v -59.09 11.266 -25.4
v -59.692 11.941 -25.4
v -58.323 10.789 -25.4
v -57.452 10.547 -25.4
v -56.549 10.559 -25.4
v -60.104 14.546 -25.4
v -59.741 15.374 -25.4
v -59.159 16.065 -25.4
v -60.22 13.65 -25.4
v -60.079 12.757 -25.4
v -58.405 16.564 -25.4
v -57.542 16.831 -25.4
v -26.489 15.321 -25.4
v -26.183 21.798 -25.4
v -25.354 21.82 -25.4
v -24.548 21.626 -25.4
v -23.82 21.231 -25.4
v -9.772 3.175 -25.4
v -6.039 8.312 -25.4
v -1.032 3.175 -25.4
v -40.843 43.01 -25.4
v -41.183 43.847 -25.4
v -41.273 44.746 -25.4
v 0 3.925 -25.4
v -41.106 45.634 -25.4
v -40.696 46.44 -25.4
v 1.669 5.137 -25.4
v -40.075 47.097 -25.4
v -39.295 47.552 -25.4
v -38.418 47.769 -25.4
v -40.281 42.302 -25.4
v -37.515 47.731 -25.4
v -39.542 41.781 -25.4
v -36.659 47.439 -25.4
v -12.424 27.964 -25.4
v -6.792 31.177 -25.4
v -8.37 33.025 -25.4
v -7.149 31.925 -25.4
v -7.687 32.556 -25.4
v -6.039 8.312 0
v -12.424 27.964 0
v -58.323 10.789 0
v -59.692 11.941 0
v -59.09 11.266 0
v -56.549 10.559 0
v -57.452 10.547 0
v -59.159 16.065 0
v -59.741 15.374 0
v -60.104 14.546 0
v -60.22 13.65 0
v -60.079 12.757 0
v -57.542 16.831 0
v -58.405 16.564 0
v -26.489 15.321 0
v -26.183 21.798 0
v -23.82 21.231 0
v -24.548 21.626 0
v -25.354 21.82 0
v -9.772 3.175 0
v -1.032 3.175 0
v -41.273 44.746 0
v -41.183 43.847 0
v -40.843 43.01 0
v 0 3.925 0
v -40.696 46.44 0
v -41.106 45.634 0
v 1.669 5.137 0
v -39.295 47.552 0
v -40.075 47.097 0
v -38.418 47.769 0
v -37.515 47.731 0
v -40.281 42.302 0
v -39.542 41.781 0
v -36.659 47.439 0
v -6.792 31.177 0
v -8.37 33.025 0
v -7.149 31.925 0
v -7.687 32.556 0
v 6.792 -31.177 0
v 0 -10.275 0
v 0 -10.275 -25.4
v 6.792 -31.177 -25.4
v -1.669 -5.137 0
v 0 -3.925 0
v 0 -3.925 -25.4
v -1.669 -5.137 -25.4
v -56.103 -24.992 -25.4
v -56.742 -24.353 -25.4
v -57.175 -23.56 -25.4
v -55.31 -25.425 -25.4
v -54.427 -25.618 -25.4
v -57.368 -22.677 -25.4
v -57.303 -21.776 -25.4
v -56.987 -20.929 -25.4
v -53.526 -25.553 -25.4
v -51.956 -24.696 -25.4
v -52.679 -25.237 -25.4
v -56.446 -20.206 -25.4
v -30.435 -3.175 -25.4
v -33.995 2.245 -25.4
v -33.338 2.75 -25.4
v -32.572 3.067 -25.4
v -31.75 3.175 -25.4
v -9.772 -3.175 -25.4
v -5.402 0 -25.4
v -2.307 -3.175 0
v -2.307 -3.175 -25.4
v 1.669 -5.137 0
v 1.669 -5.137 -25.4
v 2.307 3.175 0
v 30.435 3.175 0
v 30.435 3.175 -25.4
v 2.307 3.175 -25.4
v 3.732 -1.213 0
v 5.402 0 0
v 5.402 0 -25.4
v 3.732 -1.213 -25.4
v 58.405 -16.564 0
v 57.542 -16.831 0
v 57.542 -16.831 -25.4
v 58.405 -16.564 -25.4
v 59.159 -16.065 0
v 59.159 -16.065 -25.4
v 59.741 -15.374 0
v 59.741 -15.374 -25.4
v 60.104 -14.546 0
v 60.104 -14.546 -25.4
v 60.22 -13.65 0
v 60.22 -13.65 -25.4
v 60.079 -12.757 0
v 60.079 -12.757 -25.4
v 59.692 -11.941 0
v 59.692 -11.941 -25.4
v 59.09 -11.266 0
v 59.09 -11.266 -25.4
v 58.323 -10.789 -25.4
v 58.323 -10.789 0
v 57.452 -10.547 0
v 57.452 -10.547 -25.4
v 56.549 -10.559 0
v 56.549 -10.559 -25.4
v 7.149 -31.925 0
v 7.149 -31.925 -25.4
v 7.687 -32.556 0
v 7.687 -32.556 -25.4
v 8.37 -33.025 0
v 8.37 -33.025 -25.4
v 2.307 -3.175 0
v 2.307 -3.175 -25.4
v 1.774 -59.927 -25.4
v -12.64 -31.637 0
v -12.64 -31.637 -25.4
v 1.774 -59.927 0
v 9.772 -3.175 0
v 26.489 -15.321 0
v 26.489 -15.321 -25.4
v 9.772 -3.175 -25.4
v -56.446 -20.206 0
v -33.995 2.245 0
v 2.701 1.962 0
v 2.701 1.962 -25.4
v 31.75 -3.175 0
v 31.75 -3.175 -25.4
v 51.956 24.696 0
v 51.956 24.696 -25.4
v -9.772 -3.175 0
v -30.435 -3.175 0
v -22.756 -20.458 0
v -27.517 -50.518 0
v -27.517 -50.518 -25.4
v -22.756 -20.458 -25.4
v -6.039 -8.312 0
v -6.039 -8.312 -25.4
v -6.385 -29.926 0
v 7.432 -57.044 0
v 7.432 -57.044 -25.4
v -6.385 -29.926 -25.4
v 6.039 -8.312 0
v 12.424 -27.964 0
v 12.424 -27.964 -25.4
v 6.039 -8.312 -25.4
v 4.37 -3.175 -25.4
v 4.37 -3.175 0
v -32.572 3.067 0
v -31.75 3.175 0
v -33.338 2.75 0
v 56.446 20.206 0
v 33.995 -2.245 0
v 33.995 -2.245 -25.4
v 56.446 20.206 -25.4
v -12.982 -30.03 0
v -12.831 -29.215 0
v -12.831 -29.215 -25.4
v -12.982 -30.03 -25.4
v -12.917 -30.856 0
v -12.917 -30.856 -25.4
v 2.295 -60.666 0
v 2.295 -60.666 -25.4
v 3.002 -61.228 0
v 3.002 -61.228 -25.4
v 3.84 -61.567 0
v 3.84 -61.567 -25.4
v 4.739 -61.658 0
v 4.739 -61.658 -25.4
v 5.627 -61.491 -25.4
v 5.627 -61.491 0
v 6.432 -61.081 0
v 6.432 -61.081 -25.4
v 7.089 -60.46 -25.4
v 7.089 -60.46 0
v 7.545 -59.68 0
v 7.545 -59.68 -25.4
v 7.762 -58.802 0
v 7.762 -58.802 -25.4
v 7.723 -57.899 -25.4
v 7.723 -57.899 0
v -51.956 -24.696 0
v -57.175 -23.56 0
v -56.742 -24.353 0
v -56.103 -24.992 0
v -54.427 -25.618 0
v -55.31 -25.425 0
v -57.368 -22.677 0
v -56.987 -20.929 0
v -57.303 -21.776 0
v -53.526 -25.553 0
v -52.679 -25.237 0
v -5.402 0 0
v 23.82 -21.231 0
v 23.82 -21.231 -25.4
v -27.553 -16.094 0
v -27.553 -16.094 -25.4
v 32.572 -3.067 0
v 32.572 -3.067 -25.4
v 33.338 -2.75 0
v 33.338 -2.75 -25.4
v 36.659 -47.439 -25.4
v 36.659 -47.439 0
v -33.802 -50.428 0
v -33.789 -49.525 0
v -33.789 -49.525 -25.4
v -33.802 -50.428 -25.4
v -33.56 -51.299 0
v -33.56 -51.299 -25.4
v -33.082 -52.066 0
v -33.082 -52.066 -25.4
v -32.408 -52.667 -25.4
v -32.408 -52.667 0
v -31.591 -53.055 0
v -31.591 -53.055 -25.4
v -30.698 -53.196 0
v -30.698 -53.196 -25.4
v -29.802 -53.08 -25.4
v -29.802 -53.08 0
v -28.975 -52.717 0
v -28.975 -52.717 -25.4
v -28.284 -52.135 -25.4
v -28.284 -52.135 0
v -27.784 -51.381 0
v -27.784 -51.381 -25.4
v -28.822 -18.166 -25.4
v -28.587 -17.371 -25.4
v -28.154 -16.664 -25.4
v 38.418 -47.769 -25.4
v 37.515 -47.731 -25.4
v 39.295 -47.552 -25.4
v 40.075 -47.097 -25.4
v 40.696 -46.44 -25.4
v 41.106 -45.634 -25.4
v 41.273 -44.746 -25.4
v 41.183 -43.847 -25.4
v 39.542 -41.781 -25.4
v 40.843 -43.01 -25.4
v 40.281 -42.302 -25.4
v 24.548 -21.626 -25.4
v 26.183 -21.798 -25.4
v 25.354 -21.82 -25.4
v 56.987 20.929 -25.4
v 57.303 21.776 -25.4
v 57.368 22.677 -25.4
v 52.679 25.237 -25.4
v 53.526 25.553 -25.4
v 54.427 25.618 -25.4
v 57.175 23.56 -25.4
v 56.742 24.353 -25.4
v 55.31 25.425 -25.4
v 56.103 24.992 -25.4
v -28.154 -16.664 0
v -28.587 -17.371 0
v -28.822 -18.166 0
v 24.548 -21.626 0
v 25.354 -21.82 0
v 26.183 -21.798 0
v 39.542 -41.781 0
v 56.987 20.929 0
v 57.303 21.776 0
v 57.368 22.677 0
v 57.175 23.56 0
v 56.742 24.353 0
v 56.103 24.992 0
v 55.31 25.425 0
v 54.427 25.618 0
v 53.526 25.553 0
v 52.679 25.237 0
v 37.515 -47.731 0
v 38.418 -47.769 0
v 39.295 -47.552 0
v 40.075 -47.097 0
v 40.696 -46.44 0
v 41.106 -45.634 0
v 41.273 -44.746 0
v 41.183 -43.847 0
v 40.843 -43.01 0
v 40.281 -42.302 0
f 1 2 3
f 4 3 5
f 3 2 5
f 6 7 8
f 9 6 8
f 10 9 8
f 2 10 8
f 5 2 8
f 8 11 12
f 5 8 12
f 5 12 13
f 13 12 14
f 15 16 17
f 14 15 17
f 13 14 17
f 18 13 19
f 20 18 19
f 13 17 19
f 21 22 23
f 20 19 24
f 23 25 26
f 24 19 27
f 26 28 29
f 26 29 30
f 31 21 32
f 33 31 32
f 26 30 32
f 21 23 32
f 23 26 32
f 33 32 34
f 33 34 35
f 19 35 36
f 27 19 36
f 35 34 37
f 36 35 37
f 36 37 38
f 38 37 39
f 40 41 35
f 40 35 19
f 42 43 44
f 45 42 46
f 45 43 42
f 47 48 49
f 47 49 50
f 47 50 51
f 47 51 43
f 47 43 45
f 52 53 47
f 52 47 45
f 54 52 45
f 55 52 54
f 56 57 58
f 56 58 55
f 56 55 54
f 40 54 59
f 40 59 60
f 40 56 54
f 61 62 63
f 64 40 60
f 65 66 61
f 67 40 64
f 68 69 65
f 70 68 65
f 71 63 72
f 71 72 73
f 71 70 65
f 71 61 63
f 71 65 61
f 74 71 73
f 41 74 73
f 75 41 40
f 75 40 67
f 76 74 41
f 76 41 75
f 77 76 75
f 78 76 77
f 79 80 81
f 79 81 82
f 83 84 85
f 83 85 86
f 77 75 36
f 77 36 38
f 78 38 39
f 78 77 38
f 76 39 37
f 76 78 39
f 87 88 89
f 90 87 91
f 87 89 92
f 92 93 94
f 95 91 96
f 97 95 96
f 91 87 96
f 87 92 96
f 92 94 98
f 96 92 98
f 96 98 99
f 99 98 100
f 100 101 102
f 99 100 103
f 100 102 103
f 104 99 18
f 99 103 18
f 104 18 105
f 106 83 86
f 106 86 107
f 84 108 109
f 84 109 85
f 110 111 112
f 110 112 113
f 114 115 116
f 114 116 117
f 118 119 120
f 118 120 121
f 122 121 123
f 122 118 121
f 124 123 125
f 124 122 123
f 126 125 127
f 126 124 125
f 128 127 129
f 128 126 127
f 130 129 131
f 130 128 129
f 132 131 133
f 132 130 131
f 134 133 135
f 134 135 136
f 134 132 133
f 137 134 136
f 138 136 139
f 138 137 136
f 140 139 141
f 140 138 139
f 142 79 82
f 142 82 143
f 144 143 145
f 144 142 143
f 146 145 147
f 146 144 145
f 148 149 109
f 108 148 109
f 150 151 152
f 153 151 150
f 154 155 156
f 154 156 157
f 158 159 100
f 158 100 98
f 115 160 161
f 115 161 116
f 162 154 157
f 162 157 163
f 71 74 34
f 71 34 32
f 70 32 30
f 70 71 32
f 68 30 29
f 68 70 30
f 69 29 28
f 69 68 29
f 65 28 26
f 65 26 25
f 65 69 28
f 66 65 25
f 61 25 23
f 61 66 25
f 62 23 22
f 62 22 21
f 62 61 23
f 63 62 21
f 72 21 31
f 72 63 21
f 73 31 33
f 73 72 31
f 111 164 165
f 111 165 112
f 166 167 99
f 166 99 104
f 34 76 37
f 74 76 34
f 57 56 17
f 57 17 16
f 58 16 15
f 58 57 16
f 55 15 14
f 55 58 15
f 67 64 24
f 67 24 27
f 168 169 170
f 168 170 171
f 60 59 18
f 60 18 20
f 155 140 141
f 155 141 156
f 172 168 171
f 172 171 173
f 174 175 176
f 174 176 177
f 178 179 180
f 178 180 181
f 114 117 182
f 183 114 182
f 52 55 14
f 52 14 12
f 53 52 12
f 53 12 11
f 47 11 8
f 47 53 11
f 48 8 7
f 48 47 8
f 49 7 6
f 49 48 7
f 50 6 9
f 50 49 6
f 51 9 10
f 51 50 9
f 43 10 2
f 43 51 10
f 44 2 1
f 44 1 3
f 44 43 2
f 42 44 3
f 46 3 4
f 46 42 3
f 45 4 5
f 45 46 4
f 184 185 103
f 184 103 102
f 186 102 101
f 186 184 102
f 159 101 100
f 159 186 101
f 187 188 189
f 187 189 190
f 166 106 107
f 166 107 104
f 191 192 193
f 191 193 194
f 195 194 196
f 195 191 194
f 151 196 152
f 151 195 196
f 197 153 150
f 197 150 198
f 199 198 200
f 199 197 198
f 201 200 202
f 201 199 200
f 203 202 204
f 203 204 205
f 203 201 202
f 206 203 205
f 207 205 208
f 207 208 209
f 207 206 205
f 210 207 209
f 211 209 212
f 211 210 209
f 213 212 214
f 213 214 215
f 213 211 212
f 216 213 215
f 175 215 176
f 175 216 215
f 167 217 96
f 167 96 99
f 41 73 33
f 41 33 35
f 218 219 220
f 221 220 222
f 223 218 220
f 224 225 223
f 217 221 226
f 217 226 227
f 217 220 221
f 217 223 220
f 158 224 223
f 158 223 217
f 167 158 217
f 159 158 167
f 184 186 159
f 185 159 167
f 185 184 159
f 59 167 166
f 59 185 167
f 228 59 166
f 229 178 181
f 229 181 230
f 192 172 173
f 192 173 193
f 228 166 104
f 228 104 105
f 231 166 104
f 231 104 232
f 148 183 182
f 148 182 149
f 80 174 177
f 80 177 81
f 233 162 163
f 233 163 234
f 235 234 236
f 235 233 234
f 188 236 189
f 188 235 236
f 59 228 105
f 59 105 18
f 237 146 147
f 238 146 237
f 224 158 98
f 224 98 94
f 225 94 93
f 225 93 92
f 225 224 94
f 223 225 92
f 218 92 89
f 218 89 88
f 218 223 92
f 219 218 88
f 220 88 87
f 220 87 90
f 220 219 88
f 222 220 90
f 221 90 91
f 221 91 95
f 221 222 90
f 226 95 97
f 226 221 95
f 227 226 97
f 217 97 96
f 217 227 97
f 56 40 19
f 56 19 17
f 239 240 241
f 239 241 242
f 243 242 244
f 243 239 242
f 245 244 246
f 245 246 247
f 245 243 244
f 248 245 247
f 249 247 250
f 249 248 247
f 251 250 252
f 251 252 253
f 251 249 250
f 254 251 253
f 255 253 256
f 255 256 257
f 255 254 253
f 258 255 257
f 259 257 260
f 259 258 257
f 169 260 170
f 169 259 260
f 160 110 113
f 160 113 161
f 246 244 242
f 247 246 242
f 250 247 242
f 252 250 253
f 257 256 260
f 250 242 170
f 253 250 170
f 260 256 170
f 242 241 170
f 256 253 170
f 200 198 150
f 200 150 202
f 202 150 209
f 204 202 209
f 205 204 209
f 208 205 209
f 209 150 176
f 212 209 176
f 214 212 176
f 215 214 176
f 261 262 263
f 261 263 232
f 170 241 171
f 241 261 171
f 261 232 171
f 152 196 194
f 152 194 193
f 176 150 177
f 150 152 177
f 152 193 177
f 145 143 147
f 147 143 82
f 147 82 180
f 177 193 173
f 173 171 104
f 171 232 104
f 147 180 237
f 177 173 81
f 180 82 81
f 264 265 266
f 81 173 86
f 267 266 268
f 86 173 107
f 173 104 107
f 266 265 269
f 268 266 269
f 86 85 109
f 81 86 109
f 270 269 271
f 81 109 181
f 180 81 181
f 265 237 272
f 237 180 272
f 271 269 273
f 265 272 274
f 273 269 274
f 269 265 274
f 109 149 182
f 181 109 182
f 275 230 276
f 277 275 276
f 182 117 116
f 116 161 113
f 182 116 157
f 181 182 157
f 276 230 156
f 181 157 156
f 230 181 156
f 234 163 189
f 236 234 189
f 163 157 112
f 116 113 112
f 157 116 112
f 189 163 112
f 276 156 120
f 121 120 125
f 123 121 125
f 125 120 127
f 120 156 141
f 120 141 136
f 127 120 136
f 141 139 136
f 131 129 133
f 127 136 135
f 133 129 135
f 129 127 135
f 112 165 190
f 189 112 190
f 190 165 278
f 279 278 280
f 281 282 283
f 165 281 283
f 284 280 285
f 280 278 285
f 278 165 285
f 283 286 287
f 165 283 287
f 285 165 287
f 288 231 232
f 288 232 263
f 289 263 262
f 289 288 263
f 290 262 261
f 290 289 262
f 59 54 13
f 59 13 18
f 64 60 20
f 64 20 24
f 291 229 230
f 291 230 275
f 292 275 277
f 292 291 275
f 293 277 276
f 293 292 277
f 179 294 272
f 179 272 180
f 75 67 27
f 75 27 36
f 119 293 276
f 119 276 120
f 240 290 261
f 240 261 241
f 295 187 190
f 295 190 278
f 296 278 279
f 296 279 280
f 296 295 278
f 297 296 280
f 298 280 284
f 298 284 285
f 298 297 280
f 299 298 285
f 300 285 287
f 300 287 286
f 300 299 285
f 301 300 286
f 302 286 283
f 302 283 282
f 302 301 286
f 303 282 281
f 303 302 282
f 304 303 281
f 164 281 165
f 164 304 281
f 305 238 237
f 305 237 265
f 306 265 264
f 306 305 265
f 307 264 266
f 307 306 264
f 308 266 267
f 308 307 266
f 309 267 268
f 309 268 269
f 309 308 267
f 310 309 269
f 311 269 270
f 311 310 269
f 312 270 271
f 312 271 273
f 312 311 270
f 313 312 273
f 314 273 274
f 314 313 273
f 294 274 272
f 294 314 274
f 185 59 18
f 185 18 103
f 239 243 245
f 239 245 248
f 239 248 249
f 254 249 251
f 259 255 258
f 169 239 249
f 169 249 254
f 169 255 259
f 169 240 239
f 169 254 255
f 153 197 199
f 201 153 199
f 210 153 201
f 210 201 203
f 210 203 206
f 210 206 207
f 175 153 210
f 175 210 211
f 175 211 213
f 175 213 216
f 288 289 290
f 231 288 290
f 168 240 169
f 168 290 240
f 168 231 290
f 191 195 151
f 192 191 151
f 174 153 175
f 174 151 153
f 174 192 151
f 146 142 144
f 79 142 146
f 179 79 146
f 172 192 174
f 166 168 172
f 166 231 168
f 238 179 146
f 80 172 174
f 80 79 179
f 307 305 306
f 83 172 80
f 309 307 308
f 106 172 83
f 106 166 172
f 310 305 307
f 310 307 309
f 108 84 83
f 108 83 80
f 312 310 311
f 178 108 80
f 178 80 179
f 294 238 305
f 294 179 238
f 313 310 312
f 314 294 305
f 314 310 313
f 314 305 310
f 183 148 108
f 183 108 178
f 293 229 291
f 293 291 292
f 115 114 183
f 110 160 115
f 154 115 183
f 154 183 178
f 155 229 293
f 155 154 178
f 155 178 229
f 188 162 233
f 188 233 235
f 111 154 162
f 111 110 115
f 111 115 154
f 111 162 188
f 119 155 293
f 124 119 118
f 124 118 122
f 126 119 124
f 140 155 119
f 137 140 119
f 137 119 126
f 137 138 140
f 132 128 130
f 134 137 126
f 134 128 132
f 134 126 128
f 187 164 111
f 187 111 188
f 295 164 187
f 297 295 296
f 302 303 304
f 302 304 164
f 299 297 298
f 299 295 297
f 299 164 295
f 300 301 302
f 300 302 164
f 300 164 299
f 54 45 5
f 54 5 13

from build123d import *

# Parameters (mm, degrees)
F1_DEPTH = 25.4


# Not quite as in the source:
# - a feature names something its author has since deleted; it is built from what else it names


with BuildPart() as f1:
    # F0 (on Top) → F1 (new body)
    with BuildSketch(Plane.XY):
        with BuildLine():
            Line((9.7716452305, -3.175), (31.75, -3.175))
            ThreePointArc((31.75, -3.175), (32.9650198978, -2.9333175157), (33.9950640303, -2.2450640303))
            Line((33.9950640303, -2.2450640303), (56.4457043329, 20.2055762724))
            ThreePointArc((56.4457043329, 20.2055762724), (56.4457043329, 24.6957043329), (51.9555762724, 24.6957043329))
            Line((51.9555762724, 24.6957043329), (30.4348719395, 3.175))
            Line((30.4348719395, 3.175), (9.7716452305, 3.175))
            Line((9.7716452305, 3.175), (5.401632633, 0))
            Line((5.401632633, 0), (9.7716452305, -3.175))
        make_face()
        with BuildLine():
            Line((26.4885467967, -15.3205399243), (9.7716452305, -3.175))
            Line((9.7716452305, -3.175), (4.3700125975, -3.175))
            Line((4.3700125975, -3.175), (6.0392088785, -8.3122579143))
            Line((6.0392088785, -8.3122579143), (23.8200713954, -21.2308107174))
            ThreePointArc((23.8200713954, -21.2308107174), (24.9451005412, -21.7494562575), (26.1829689979, -21.7980922417))
            Line((26.1829689979, -21.7980922417), (57.5420738118, -16.8312979766))
            ThreePointArc((57.5420738118, -16.8312979766), (60.1813048667, -13.1987080688), (56.5487149588, -10.5594770139))
            Line((56.5487149588, -10.5594770139), (26.4885467967, -15.3205399243))
        make_face()
        Polygon((4.3700125975, -3.175), (9.7716452305, -3.175), (5.401632633, 0), (3.7324363521, -1.2127420857), align=None)
        Polygon((6.0392088785, -8.3122579143), (4.3700125975, -3.175), (2.3067725264, -3.175), (1.669196281, -5.1372579143), align=None)
        Polygon((2.7008163165, 1.9622579143), (5.401632633, 0), (9.7716452305, 3.175), (2.3067725264, 3.175), align=None)
        with BuildLine():
            Line((12.4244970902, -27.9641543235), (6.0392088785, -8.3122579143))
            Line((6.0392088785, -8.3122579143), (1.669196281, -5.1372579143))
            Line((1.669196281, -5.1372579143), (0, -10.2745158286))
            Line((0, -10.2745158286), (6.7916851322, -31.1771733495))
            ThreePointArc((6.7916851322, -31.1771733495), (7.3970006306, -32.2580419458), (8.3698697347, -33.0249901067))
            Line((8.3698697347, -33.0249901067), (36.6593268777, -47.4391884734))
            ThreePointArc((36.6593268777, -47.4391884734), (40.9296924287, -46.0516625958), (39.5421665511, -41.7812970448))
            Line((39.5421665511, -41.7812970448), (12.4244970902, -27.9641543235))
        make_face()
        Polygon((0, -10.2745158286), (1.669196281, -5.1372579143), (0, -3.9245158286), (-1.669196281, -5.1372579143), align=None)
        with BuildLine():
            Line((-6.3852882117, -29.9264122378), (0, -10.2745158286))
            Line((0, -10.2745158286), (-1.669196281, -5.1372579143))
            Line((-1.669196281, -5.1372579143), (-6.0392088785, -8.3122579143))
            Line((-6.0392088785, -8.3122579143), (-12.8308940106, -29.2149154352))
            ThreePointArc((-12.8308940106, -29.2149154352), (-12.976502106, -30.4451520213), (-12.6402352857, -31.637464229))
            Line((-12.6402352857, -31.637464229), (1.773963081, -59.926921372))
            ThreePointArc((1.773963081, -59.926921372), (6.044328632, -61.3144472496), (7.4318545096, -57.0440816987))
            Line((7.4318545096, -57.0440816987), (-6.3852882117, -29.9264122378))
        make_face()
        with BuildLine():
            Line((-6.0392088785, -8.3122579143), (-1.669196281, -5.1372579143))
            Line((-1.669196281, -5.1372579143), (-2.3067725264, -3.175))
            Line((-2.3067725264, -3.175), (-9.7716452305, -3.175))
            Line((-9.7716452305, -3.175), (-27.5525077474, -16.0935528031))
            ThreePointArc((-27.5525077474, -16.0935528031), (-28.3934220932, -17.0032488173), (-28.8222000528, -18.1655023338))
            Line((-28.8222000528, -18.1655023338), (-33.7889943178, -49.5246071477))
            ThreePointArc((-33.7889943178, -49.5246071477), (-31.1497632629, -53.1571970556), (-27.517173355, -50.5179660007))
            Line((-27.517173355, -50.5179660007), (-22.7561104446, -20.4577978386))
            Line((-22.7561104446, -20.4577978386), (-6.0392088785, -8.3122579143))
        make_face()
    extrude(amount=-F1_DEPTH)


with BuildPart() as f1b:
    # F0 (on Top) → F1, piece 2 (new body)
    with BuildSketch(Plane.XY):
        Polygon((0, 3.9245158286), (1.669196281, 5.1372579143), (0, 10.2745158286), (-1.669196281, 5.1372579143), align=None)
        Polygon((-1.0316200355, 3.175), (0, 3.9245158286), (-1.669196281, 5.1372579143), (-2.3067725264, 3.175), align=None)
        with BuildLine():
            Line((-1.669196281, 5.1372579143), (0, 10.2745158286))
            Line((0, 10.2745158286), (-6.7916851322, 31.1771733495))
            ThreePointArc((-6.7916851322, 31.1771733495), (-7.3970006306, 32.2580419458), (-8.3698697347, 33.0249901067))
            Line((-8.3698697347, 33.0249901067), (-36.6593268777, 47.4391884734))
            ThreePointArc((-36.6593268777, 47.4391884734), (-40.9296924287, 46.0516625958), (-39.5421665511, 41.7812970448))
            Line((-39.5421665511, 41.7812970448), (-12.4244970902, 27.9641543235))
            Line((-12.4244970902, 27.9641543235), (-6.0392088785, 8.3122579143))
            Line((-6.0392088785, 8.3122579143), (-1.669196281, 5.1372579143))
        make_face()
        Polygon((-2.3067725264, 3.175), (-1.669196281, 5.1372579143), (-6.0392088785, 8.3122579143), (-4.3700125975, 3.175), align=None)
        with BuildLine():
            Line((-4.3700125975, 3.175), (-6.0392088785, 8.3122579143))
            Line((-6.0392088785, 8.3122579143), (-23.8200713954, 21.2308107174))
            ThreePointArc((-23.8200713954, 21.2308107174), (-24.9451005412, 21.7494562575), (-26.1829689979, 21.7980922417))
            Line((-26.1829689979, 21.7980922417), (-57.5420738118, 16.8312979766))
            ThreePointArc((-57.5420738118, 16.8312979766), (-60.1813048667, 13.1987080688), (-56.5487149588, 10.5594770139))
            Line((-56.5487149588, 10.5594770139), (-26.4885467967, 15.3205399243))
            Line((-26.4885467967, 15.3205399243), (-9.7716452305, 3.175))
            Line((-9.7716452305, 3.175), (-4.3700125975, 3.175))
        make_face()
    extrude(amount=-F1_DEPTH)


with BuildPart() as f1c:
    # F0 (on Top) → F1, piece 3 (new body)
    with BuildSketch(Plane.XY):
        with BuildLine():
            Line((-30.4348719395, -3.175), (-9.7716452305, -3.175))
            Line((-9.7716452305, -3.175), (-5.401632633, 0))
            Line((-5.401632633, 0), (-9.7716452305, 3.175))
            Line((-9.7716452305, 3.175), (-31.75, 3.175))
            ThreePointArc((-31.75, 3.175), (-32.9650198978, 2.9333175157), (-33.9950640303, 2.2450640303))
            Line((-33.9950640303, 2.2450640303), (-56.4457043329, -20.2055762724))
            ThreePointArc((-56.4457043329, -20.2055762724), (-56.4457043329, -24.6957043329), (-51.9555762724, -24.6957043329))
            Line((-51.9555762724, -24.6957043329), (-30.4348719395, -3.175))
        make_face()
    extrude(amount=-F1_DEPTH)


solid = Compound([f1.part, f1b.part, f1c.part])
